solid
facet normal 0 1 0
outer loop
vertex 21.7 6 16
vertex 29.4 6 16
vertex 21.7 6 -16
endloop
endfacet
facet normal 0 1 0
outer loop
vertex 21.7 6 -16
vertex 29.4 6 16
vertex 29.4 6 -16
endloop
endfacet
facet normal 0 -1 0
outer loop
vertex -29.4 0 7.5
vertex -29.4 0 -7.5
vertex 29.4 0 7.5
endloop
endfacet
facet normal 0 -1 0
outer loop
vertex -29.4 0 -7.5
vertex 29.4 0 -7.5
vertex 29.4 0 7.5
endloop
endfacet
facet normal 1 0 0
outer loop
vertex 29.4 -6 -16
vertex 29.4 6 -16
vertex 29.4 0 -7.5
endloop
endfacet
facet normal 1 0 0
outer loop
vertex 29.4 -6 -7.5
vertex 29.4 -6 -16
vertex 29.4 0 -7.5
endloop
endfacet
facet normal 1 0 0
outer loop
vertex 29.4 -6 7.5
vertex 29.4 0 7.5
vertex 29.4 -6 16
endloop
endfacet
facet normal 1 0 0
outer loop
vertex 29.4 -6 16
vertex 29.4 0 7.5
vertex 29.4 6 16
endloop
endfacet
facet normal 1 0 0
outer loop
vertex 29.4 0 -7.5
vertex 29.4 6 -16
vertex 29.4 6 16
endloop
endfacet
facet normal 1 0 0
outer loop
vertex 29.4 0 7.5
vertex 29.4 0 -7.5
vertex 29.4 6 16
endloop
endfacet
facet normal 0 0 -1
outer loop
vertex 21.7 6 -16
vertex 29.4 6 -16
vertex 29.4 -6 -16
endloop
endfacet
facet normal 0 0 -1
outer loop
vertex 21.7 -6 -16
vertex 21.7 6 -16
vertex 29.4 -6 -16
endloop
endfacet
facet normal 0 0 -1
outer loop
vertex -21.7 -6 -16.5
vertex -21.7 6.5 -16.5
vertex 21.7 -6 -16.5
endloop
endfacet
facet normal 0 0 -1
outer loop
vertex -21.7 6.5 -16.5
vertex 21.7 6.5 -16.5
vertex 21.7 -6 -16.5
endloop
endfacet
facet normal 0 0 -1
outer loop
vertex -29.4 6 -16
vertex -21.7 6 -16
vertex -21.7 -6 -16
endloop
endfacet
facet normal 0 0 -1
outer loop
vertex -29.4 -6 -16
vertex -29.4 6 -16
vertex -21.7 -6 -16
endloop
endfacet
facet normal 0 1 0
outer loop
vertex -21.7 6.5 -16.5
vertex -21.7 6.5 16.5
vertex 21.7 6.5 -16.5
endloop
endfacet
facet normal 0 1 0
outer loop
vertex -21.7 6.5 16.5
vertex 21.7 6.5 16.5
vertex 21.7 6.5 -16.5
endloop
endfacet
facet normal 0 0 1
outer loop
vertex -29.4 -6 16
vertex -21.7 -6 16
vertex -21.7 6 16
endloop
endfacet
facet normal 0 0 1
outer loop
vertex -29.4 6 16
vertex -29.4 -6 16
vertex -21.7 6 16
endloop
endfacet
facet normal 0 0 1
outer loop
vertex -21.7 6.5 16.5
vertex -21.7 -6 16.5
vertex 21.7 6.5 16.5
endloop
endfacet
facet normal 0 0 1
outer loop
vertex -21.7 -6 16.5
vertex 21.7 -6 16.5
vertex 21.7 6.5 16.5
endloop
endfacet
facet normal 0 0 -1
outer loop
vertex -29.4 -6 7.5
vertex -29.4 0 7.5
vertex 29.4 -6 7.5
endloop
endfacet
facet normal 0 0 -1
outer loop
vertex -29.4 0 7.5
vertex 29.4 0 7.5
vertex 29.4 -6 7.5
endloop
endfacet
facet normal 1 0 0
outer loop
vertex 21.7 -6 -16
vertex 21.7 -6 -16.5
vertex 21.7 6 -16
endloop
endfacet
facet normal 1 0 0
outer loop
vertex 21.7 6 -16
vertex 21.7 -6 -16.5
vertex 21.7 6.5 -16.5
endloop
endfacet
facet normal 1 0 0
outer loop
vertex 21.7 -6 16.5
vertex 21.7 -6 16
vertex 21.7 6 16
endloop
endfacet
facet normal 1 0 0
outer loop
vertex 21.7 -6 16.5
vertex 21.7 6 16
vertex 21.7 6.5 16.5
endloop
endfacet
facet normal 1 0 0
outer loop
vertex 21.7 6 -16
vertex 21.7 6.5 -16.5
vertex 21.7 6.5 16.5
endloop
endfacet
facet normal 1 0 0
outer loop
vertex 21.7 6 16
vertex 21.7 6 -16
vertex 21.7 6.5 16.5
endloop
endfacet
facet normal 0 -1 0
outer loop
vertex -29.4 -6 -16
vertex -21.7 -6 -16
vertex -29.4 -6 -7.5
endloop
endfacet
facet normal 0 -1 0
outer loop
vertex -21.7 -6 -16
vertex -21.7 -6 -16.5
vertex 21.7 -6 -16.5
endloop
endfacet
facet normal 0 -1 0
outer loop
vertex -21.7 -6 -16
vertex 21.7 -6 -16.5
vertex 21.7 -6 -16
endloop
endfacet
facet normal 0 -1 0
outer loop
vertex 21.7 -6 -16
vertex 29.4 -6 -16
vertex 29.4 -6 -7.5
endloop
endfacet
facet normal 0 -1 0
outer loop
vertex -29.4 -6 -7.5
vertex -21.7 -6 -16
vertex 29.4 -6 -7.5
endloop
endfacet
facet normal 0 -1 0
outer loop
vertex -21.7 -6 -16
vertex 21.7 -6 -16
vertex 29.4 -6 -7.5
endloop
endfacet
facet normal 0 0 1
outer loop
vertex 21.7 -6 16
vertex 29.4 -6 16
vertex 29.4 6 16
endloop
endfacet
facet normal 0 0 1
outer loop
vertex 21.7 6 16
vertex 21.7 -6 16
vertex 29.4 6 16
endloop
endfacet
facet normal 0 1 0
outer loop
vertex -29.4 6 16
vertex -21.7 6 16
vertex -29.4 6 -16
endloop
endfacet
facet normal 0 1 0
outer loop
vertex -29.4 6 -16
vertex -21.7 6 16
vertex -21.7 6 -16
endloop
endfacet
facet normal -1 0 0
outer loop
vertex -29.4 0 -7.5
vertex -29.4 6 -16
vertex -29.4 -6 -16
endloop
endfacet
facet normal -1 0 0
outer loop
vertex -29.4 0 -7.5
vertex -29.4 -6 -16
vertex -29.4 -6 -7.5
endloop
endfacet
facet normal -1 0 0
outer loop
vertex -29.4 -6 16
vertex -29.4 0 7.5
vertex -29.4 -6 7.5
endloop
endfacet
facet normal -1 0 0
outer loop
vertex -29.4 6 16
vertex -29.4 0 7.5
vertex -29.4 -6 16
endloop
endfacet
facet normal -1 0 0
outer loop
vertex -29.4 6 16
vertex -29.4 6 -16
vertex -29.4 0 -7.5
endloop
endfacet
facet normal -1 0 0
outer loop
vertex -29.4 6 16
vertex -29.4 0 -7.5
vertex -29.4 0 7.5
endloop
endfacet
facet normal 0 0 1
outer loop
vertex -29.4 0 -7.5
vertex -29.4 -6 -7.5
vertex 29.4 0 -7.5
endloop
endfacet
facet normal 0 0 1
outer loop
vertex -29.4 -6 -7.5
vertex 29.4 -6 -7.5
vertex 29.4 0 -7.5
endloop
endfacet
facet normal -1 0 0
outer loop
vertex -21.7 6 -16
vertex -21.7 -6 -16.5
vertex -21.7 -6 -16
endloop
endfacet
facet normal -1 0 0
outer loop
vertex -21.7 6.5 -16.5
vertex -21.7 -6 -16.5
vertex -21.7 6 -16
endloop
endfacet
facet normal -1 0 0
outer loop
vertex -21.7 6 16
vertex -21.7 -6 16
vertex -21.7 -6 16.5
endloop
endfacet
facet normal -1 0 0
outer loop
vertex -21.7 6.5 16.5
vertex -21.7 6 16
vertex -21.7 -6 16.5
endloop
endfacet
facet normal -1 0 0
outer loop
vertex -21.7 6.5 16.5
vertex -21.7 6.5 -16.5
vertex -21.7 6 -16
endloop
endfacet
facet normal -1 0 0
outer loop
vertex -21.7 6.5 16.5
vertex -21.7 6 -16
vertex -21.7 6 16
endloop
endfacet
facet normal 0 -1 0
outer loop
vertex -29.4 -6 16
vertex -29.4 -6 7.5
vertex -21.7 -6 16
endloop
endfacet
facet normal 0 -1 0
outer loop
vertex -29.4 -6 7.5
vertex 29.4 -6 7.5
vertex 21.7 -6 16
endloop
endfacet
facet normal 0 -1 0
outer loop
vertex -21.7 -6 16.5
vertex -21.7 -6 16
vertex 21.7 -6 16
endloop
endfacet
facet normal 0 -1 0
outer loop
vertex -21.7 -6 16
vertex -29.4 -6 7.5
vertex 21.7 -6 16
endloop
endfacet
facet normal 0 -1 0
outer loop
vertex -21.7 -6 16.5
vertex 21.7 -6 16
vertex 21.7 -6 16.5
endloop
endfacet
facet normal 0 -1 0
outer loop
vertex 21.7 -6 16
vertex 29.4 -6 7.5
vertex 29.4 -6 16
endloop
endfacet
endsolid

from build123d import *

# Parameters (mm, degrees)
BOSS_EXTRUDE1_DEPTH = 29.4
BOSS_EXTRUDE2_DEPTH = 21.7


with BuildPart() as part:
    # Sketch1 → Boss-Extrude1 (new, symmetric)
    with BuildSketch(Plane(origin=(0, 0, 0), x_dir=(0, 0, -1), z_dir=(1, 0, 0))):
        Polygon((-16, 6), (16, 6), (16, -6), (7.5, -6), (7.5, 0), (-7.5, 0), (-7.5, -6), (-16, -6), align=None)
    extrude(amount=BOSS_EXTRUDE1_DEPTH, both=True)

    # Sketch2 → Boss-Extrude2 (add, symmetric)
    with BuildSketch(Plane(origin=(0, 0, 0), x_dir=(0, 0, -1), z_dir=(1, 0, 0))):
        Polygon((-16, -6), (-16.5, -6), (-16.5, 6.5), (16.5, 6.5), (16.5, -6), (16, -6), (16, 6), (-16, 6), align=None)
    extrude(amount=BOSS_EXTRUDE2_DEPTH, both=True)


solid = part.part
